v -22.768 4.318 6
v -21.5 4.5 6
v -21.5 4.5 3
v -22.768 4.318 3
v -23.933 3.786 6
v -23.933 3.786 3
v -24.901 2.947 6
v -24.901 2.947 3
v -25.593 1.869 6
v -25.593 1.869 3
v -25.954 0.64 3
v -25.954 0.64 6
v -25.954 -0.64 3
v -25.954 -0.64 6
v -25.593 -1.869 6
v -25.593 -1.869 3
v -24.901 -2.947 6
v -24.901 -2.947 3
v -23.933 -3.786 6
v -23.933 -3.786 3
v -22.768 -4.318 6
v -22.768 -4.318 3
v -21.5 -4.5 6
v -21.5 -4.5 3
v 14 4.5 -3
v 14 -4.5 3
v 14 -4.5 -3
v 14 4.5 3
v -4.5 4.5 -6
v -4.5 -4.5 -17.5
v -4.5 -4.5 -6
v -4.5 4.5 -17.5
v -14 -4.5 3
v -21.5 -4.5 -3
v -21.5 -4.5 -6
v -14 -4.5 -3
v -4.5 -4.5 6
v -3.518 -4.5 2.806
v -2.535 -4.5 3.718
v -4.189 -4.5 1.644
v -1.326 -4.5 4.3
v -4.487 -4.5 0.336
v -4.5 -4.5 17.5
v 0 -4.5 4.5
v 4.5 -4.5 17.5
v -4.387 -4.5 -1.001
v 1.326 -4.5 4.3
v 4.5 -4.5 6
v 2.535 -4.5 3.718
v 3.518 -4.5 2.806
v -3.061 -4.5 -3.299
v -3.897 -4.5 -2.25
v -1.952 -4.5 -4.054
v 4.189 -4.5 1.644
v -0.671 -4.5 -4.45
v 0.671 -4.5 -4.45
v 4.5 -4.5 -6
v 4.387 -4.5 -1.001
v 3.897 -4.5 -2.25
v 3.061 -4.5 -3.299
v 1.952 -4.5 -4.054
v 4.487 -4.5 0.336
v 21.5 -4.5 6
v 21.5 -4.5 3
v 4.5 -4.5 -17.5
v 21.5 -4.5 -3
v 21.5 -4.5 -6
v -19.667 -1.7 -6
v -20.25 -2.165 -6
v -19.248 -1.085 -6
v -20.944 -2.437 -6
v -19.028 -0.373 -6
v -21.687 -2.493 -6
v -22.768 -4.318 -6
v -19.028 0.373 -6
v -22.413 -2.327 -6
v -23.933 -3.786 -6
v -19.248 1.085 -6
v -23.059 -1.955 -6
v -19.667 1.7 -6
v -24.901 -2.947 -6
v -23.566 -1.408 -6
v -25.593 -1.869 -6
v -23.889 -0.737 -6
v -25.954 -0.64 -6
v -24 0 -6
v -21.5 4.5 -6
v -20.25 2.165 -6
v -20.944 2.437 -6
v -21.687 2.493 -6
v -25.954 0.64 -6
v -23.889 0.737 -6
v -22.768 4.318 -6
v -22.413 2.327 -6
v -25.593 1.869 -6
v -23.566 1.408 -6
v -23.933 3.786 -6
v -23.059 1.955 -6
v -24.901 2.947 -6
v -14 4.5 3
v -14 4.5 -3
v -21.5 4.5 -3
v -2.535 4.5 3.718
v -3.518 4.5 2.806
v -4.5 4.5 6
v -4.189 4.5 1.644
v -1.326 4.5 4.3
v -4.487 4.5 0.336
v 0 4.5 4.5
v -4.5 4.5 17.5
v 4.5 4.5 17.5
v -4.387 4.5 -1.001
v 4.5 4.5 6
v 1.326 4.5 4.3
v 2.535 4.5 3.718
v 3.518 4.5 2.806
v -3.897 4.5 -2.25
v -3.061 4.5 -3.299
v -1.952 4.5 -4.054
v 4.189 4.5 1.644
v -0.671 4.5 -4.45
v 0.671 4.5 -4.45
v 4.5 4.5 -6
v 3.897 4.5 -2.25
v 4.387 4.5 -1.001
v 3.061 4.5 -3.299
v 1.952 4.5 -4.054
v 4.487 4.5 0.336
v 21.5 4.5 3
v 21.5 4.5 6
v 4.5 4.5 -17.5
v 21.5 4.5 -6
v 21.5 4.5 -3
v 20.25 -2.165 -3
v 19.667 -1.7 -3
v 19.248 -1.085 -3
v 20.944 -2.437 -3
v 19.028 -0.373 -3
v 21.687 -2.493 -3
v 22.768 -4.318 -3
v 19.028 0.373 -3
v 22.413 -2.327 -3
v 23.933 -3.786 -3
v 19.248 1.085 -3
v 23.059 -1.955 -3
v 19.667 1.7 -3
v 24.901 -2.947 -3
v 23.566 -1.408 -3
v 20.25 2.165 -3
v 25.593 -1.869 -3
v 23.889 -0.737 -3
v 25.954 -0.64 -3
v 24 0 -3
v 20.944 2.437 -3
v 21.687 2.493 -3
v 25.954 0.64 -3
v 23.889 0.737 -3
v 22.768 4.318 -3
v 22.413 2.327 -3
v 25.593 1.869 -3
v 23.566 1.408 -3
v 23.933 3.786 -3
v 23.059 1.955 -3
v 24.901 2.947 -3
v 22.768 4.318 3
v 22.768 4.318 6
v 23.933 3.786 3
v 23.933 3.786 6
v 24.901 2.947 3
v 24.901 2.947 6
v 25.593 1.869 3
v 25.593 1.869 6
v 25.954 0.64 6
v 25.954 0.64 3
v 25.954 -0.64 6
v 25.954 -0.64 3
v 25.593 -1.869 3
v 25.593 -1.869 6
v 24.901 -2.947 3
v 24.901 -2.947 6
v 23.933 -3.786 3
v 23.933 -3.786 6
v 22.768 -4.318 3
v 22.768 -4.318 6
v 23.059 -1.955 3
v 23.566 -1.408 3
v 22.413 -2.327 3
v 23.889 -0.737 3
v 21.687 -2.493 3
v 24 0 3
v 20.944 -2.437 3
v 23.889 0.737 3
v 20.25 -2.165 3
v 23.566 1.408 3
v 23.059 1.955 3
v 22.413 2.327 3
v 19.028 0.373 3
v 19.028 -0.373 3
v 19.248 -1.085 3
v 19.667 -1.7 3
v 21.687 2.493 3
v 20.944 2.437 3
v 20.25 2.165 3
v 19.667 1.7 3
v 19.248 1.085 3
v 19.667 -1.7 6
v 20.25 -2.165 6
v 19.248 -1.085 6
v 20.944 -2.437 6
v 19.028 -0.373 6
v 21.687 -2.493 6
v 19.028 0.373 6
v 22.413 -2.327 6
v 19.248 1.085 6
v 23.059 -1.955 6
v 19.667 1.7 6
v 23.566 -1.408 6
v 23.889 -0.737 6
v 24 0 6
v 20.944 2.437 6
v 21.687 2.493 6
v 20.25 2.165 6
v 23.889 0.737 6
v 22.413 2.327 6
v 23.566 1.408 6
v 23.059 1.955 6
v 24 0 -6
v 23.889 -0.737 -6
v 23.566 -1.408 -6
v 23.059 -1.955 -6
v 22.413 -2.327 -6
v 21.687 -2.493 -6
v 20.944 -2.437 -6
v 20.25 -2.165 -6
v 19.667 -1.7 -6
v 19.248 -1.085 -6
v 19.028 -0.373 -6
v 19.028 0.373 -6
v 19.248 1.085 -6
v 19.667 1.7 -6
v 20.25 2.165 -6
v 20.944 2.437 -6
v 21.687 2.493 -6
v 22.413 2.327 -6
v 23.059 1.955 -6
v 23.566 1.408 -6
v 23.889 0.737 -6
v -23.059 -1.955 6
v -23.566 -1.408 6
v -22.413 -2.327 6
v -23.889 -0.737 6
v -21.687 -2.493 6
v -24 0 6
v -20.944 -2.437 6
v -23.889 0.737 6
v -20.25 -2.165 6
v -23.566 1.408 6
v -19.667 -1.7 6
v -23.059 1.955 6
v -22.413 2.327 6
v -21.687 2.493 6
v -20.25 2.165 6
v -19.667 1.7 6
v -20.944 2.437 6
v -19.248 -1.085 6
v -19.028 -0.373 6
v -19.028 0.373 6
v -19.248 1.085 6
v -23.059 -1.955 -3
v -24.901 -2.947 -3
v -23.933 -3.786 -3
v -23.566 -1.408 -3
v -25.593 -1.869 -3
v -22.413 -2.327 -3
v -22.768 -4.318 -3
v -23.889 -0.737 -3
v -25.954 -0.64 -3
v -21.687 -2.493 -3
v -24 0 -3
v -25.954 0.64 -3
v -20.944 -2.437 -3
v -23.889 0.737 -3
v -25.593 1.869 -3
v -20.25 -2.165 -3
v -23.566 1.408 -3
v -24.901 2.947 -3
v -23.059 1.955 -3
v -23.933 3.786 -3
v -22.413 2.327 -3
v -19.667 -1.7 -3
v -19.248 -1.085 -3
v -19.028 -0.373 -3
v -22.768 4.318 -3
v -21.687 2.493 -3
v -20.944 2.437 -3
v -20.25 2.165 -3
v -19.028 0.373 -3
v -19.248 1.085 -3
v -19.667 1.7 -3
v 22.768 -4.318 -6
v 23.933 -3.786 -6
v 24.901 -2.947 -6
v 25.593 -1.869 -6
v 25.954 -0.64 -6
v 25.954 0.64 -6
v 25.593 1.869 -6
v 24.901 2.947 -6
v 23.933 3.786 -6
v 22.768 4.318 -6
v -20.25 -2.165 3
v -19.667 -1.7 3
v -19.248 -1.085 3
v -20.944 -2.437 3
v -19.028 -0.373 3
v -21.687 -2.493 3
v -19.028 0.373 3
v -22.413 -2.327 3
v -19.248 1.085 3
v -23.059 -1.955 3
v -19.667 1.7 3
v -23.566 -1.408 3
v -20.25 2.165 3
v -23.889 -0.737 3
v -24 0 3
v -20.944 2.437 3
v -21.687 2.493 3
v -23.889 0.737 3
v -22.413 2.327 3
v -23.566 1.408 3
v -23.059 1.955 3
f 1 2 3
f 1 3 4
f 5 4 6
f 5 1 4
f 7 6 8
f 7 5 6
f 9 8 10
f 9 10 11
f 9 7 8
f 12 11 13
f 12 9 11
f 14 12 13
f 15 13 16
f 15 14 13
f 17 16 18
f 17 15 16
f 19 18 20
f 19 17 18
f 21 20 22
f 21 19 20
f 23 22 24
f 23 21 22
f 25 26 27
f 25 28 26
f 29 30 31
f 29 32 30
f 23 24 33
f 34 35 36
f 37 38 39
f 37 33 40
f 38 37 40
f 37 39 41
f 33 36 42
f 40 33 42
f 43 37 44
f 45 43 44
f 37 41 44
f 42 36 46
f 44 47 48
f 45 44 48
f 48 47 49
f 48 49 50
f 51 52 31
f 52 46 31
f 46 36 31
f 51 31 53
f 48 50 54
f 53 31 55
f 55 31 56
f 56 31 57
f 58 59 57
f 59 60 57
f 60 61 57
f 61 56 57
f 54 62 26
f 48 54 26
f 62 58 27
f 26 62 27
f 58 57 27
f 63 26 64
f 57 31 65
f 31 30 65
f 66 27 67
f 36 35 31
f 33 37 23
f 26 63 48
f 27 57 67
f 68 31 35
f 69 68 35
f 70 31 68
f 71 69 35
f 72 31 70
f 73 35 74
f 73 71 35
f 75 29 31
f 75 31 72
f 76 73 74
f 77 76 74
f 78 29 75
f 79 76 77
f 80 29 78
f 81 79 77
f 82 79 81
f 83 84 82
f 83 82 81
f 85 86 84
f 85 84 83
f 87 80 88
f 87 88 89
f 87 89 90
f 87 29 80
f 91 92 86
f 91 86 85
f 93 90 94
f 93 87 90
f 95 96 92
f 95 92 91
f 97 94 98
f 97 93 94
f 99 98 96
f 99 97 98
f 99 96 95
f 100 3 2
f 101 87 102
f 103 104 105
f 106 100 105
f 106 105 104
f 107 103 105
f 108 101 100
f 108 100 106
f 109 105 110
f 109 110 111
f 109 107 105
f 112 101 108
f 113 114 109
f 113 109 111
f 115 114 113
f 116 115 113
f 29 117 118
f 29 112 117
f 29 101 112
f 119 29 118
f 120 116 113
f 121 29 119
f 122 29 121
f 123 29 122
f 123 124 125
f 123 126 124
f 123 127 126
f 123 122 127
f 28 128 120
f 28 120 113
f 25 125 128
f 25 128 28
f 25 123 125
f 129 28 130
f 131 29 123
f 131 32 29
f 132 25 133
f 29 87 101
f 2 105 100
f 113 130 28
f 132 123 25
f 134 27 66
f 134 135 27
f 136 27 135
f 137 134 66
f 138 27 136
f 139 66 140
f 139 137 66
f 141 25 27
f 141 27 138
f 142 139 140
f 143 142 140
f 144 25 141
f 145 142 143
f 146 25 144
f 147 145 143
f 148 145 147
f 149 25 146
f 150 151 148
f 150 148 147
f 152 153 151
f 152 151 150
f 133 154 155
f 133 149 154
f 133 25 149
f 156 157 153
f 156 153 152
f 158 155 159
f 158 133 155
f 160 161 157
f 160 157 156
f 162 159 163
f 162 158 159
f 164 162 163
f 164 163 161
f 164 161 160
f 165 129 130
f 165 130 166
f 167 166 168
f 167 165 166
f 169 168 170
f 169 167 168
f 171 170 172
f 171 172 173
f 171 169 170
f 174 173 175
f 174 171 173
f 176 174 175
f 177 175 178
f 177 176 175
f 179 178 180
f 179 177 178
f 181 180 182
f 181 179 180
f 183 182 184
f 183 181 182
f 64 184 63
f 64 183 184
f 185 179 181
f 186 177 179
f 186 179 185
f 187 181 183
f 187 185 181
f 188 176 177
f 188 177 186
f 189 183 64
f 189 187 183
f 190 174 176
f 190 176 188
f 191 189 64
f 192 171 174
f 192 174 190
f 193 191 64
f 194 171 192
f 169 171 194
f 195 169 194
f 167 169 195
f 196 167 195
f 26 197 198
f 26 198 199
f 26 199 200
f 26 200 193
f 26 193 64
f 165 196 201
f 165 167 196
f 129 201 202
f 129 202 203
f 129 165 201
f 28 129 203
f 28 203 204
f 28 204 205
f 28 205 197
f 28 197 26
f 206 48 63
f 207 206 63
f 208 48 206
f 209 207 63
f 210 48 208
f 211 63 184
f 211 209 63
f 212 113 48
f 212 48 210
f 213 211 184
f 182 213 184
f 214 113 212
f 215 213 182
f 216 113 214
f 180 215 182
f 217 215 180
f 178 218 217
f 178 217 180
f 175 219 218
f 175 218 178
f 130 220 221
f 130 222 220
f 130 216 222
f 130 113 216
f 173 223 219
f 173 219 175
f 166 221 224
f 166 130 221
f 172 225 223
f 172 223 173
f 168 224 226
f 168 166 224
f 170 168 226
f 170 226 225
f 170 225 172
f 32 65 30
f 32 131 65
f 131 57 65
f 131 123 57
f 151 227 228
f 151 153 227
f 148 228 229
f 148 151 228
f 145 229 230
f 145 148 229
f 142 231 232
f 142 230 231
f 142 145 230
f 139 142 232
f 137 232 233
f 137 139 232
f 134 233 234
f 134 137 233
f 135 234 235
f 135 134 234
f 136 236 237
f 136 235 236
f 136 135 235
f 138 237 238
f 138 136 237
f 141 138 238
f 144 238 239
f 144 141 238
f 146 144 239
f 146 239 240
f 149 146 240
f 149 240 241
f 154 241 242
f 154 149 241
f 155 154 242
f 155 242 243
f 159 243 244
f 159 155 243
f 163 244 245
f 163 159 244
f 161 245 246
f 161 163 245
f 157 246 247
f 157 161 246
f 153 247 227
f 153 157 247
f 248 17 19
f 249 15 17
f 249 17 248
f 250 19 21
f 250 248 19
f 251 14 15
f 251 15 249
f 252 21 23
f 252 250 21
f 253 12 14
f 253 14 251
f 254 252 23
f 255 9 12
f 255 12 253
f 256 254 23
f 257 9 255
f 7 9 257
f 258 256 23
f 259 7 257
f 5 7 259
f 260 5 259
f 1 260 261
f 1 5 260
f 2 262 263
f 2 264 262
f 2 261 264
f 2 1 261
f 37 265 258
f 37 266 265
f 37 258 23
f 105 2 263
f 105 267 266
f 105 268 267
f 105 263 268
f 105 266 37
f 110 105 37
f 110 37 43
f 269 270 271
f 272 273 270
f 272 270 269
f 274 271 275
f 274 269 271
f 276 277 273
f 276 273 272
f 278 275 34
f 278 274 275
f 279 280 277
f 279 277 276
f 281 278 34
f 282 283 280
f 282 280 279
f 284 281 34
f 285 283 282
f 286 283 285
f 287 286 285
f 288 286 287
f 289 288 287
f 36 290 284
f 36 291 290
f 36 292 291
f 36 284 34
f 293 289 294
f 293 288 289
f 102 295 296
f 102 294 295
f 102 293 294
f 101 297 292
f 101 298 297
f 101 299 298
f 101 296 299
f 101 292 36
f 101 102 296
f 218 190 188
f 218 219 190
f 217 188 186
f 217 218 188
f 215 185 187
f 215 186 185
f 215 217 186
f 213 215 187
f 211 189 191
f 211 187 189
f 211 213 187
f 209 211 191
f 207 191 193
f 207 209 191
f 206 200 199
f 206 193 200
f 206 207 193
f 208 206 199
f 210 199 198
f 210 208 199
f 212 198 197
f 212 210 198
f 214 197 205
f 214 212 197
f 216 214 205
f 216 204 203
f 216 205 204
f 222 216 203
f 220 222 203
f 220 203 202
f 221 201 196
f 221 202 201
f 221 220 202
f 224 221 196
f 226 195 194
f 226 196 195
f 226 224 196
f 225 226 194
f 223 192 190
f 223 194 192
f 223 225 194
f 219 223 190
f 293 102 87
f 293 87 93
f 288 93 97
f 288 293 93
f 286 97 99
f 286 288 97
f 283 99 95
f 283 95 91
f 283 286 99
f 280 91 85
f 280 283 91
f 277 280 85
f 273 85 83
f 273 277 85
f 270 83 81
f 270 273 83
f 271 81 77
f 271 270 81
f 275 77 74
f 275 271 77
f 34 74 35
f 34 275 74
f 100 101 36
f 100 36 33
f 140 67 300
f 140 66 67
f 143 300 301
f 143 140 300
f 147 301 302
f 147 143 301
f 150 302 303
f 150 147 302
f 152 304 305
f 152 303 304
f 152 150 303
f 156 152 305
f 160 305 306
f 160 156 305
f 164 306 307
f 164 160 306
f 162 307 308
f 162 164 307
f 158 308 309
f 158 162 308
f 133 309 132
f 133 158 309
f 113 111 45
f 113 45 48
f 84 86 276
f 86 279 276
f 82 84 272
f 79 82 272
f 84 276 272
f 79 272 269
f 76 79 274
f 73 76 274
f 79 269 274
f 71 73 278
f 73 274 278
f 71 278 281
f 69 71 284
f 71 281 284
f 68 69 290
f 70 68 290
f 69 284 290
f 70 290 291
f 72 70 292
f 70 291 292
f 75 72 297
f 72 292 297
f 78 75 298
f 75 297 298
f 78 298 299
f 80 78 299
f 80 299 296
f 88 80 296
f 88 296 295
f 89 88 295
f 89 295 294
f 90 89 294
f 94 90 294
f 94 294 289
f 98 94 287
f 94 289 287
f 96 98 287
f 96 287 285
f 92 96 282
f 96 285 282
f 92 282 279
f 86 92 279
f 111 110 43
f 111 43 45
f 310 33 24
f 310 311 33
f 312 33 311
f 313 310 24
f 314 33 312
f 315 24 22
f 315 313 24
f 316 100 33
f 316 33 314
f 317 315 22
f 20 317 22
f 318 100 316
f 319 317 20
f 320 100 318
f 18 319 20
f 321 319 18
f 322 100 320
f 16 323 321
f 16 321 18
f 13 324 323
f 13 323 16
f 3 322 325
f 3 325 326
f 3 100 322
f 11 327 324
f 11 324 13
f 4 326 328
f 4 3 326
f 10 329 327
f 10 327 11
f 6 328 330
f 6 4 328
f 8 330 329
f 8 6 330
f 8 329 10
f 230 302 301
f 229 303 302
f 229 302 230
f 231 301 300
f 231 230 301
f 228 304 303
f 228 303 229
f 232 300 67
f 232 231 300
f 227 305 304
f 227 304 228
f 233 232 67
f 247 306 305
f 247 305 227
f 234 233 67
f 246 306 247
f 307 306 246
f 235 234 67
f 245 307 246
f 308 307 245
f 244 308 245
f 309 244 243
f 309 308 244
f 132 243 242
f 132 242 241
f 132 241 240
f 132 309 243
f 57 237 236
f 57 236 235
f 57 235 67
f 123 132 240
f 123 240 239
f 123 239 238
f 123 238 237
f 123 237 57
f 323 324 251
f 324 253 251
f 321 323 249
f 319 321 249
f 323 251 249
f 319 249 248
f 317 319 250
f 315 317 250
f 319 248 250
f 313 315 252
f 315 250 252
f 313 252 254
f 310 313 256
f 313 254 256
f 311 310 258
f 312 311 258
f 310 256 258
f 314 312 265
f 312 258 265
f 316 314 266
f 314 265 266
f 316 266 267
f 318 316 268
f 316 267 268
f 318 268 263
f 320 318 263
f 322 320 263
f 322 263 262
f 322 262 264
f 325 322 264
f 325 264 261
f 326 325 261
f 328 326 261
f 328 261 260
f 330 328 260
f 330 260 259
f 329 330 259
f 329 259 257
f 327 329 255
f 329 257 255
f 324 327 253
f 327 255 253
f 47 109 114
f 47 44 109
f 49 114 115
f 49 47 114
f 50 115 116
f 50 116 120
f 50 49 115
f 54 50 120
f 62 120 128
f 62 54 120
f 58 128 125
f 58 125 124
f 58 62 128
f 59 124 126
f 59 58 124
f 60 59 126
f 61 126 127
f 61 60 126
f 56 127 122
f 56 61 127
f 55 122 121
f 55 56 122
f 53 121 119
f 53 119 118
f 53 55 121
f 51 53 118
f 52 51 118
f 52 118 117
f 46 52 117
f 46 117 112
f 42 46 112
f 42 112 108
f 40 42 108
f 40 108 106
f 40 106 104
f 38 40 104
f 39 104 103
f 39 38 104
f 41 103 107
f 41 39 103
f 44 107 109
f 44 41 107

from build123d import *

# Parameters (mm, degrees)
SKETCH1_R           = 4.5
BOSS_EXTRUDE1_DEPTH = 4.5
FILLET2_RADIUS      = 4.5
FILLET2_LENGTH      = 3
FILLET3_RADIUS      = 4.5
FILLET3_LENGTH      = 3
FILLET4_RADIUS      = 4.5
FILLET4_LENGTH      = 3
FILLET5_RADIUS      = 4.5
FILLET5_LENGTH      = 3
SKETCH2_R           = 2.5
CUT_EXTRUDE1_DEPTH  = 34.414068893


with BuildPart() as part:
    # Sketch1 → Boss-Extrude1 (new, symmetric)
    with BuildSketch(Plane(origin=(0, 0, 0), x_dir=(1, 0, 0), z_dir=(0, 1, 0))):
        Polygon((-26, 3), (-14, 3), (-14, -3), (-26, -3), (-26, -6), (-4.5, -6), (-4.5, -17.5), (4.5, -17.5), (4.5, -6), (26, -6), (26, -3), (14, -3), (14, 3), (26, 3), (26, 6), (4.5, 6), (4.5, 17.5), (-4.5, 17.5), (-4.5, 6), (-26, 6), align=None)
        with Locations(Location((0, 0, 0), (0, 0, 270))):
            Circle(SKETCH1_R, mode=Mode.SUBTRACT)
    extrude(amount=BOSS_EXTRUDE1_DEPTH, both=True)

    # Fillet2: full round fillet: the end face becomes a half cylinder, R = half its width
    fillet2_face = Plane((-26, 0, 4.5), x_dir=(0, 0, 1), z_dir=(-1, 0, 0))  # on the end face: x along it, z out of the body
    fillet2_slab = fillet2_face.offset(-FILLET2_RADIUS / 2) * Box(FILLET2_LENGTH, 2 * FILLET2_RADIUS, FILLET2_RADIUS, mode=Mode.PRIVATE)  # the body's end, R deep
    fillet2_round = Plane((-21.5, 0, 4.5), x_dir=(-1, 0, 0), z_dir=(0, 0, 1)) * Cylinder(FILLET2_RADIUS, FILLET2_LENGTH, mode=Mode.PRIVATE)  # its axis R under the face
    add(fillet2_slab - fillet2_round, mode=Mode.SUBTRACT)

    # Fillet3: full round fillet: the end face becomes a half cylinder, R = half its width
    fillet3_face = Plane((-26, 0, -4.5), x_dir=(0, 0, 1), z_dir=(-1, 0, 0))  # on the end face: x along it, z out of the body
    fillet3_slab = fillet3_face.offset(-FILLET3_RADIUS / 2) * Box(FILLET3_LENGTH, 2 * FILLET3_RADIUS, FILLET3_RADIUS, mode=Mode.PRIVATE)  # the body's end, R deep
    fillet3_round = Plane((-21.5, 0, -4.5), x_dir=(-1, 0, 0), z_dir=(0, 0, 1)) * Cylinder(FILLET3_RADIUS, FILLET3_LENGTH, mode=Mode.PRIVATE)  # its axis R under the face
    add(fillet3_slab - fillet3_round, mode=Mode.SUBTRACT)

    # Fillet4: full round fillet: the end face becomes a half cylinder, R = half its width
    fillet4_face = Plane((26, 0, -4.5), x_dir=(0, 0, 1), z_dir=(1, 0, 0))  # on the end face: x along it, z out of the body
    fillet4_slab = fillet4_face.offset(-FILLET4_RADIUS / 2) * Box(FILLET4_LENGTH, 2 * FILLET4_RADIUS, FILLET4_RADIUS, mode=Mode.PRIVATE)  # the body's end, R deep
    fillet4_round = Plane((21.5, 0, -4.5), x_dir=(1, 0, 0), z_dir=(0, 0, 1)) * Cylinder(FILLET4_RADIUS, FILLET4_LENGTH, mode=Mode.PRIVATE)  # its axis R under the face
    add(fillet4_slab - fillet4_round, mode=Mode.SUBTRACT)

    # Fillet5: full round fillet: the end face becomes a half cylinder, R = half its width
    fillet5_face = Plane((26, 0, 4.5), x_dir=(0, 0, -1), z_dir=(1, 0, 0))  # on the end face: x along it, z out of the body
    fillet5_slab = fillet5_face.offset(-FILLET5_RADIUS / 2) * Box(FILLET5_LENGTH, 2 * FILLET5_RADIUS, FILLET5_RADIUS, mode=Mode.PRIVATE)  # the body's end, R deep
    fillet5_round = Plane((21.5, 0, 4.5), x_dir=(1, 0, 0), z_dir=(0, 0, -1)) * Cylinder(FILLET5_RADIUS, FILLET5_LENGTH, mode=Mode.PRIVATE)  # its axis R under the face
    add(fillet5_slab - fillet5_round, mode=Mode.SUBTRACT)

    # Sketch2 → Cut-Extrude1 (cut, symmetric)
    with BuildSketch(Plane.XY.offset(-3)):
        with Locations(Location((-21.5, 0, 0), (0, 0, 180))):
            Circle(SKETCH2_R)
    cut_extrude1 = extrude(amount=CUT_EXTRUDE1_DEPTH, both=True, mode=Mode.SUBTRACT)

    # Mirror1: Cut-Extrude1 across plane
    add(cut_extrude1.mirror(Plane(origin=(0, 0, 0), x_dir=(0, 0, 1), z_dir=(1, 0, 0))), mode=Mode.SUBTRACT)


solid = part.part
